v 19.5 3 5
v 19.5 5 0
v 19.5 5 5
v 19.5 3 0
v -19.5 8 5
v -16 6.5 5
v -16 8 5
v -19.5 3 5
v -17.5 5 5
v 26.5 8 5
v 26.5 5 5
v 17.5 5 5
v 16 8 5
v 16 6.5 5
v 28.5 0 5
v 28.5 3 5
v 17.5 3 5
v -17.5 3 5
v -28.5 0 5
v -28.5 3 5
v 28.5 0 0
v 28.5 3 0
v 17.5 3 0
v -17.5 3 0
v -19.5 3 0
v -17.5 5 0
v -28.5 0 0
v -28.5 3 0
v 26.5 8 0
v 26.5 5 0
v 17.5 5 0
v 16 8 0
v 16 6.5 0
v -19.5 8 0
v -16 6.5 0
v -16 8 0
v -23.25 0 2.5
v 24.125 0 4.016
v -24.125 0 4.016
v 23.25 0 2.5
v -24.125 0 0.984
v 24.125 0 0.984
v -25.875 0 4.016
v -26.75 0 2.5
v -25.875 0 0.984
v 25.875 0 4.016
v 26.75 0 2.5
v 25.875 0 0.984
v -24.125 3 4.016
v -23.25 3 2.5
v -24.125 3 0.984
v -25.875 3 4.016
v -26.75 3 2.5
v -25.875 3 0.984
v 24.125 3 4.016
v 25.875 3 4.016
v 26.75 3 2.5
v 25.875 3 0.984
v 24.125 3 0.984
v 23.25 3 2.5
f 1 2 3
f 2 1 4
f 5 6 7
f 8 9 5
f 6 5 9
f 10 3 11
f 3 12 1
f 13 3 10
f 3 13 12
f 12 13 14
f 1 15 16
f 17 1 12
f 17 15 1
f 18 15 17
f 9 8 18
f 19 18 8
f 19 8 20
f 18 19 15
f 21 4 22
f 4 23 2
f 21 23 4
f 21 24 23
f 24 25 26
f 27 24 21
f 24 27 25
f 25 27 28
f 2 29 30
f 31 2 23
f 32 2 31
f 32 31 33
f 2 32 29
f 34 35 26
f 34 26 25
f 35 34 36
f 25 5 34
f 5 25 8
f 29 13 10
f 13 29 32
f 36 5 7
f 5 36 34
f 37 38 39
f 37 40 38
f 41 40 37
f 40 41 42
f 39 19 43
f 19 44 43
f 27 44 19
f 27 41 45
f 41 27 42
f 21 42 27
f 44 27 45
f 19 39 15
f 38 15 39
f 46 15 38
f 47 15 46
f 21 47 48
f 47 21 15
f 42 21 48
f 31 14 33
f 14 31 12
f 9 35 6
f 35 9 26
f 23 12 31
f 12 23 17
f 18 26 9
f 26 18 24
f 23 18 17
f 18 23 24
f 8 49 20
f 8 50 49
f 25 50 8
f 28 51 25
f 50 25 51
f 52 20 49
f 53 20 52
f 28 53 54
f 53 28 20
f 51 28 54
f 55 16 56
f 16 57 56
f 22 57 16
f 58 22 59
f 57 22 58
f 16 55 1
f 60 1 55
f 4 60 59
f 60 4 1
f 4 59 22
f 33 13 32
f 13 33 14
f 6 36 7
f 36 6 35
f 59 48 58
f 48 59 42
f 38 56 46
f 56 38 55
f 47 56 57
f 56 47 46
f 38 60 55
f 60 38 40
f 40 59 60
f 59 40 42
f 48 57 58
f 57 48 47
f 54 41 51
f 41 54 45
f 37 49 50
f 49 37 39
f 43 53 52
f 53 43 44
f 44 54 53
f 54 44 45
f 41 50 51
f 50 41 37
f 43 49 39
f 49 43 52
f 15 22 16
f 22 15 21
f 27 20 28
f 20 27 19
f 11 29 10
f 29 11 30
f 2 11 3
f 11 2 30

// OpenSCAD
hole_space = 50;
hole_diameter = 3.5000000000;
height = 5;
thick = 2;

union() {
	difference() {
		translate(v = [0, ((2 + (3 * thick)) / 2), 0]) {
			translate(v = [0, 0, (height / 2)]) {
				cube(center = true, size = [(35 + (2 * thick)), (2 + (3 * thick)), height]);
			}
		}
		translate(v = [0, 13.7500000000, 0]) {
			translate(v = [0, -8.7500000000, 0]) {
				translate(v = [-17.5000000000, 0, 0]) {
					linear_extrude(height = height) {
						polygon(points = [[0, 0], [35, 0], [17.5000000000, 17.5000000000]]);
					}
				}
			}
		}
		translate(v = [0, 4.0000000000, 0]) {
			translate(v = [0, 0, (height / 2)]) {
				cube(center = true, size = [35, 2, height]);
			}
		}
		translate(v = [0, 8, 0]) {
			translate(v = [0, 0, (height / 2)]) {
				cube(center = true, size = [32, 3, height]);
			}
		}
	}
	translate(v = [0, ((1.5 + (2 + (3 * thick))) - 3), 0]) {
		translate(v = [22.0000000000, 0, 0]) {
			translate(v = [0, 0, (height / 2)]) {
				cube(center = true, size = [9, 3, height]);
			}
		}
	}
	difference() {
		translate(v = [0, 1.5000000000, 0]) {
			translate(v = [0, 0, (height / 2)]) {
				cube(center = true, size = [(hole_space + (2 * hole_diameter)), 3, height]);
			}
		}
		union() {
			translate(v = [0, 3, 0]) {
				translate(v = [(hole_space / 2), 0, 0]) {
					translate(v = [0, 0, (height / 2)]) {
						rotate(a = [90, 0, 0]) {
							cylinder(d = hole_diameter, h = 3);
						}
					}
				}
			}
			translate(v = [(-hole_space), 0, 0]) {
				translate(v = [0, 3, 0]) {
					translate(v = [(hole_space / 2), 0, 0]) {
						translate(v = [0, 0, (height / 2)]) {
							rotate(a = [90, 0, 0]) {
								cylinder(d = hole_diameter, h = 3);
							}
						}
					}
				}
			}
		}
	}
}
